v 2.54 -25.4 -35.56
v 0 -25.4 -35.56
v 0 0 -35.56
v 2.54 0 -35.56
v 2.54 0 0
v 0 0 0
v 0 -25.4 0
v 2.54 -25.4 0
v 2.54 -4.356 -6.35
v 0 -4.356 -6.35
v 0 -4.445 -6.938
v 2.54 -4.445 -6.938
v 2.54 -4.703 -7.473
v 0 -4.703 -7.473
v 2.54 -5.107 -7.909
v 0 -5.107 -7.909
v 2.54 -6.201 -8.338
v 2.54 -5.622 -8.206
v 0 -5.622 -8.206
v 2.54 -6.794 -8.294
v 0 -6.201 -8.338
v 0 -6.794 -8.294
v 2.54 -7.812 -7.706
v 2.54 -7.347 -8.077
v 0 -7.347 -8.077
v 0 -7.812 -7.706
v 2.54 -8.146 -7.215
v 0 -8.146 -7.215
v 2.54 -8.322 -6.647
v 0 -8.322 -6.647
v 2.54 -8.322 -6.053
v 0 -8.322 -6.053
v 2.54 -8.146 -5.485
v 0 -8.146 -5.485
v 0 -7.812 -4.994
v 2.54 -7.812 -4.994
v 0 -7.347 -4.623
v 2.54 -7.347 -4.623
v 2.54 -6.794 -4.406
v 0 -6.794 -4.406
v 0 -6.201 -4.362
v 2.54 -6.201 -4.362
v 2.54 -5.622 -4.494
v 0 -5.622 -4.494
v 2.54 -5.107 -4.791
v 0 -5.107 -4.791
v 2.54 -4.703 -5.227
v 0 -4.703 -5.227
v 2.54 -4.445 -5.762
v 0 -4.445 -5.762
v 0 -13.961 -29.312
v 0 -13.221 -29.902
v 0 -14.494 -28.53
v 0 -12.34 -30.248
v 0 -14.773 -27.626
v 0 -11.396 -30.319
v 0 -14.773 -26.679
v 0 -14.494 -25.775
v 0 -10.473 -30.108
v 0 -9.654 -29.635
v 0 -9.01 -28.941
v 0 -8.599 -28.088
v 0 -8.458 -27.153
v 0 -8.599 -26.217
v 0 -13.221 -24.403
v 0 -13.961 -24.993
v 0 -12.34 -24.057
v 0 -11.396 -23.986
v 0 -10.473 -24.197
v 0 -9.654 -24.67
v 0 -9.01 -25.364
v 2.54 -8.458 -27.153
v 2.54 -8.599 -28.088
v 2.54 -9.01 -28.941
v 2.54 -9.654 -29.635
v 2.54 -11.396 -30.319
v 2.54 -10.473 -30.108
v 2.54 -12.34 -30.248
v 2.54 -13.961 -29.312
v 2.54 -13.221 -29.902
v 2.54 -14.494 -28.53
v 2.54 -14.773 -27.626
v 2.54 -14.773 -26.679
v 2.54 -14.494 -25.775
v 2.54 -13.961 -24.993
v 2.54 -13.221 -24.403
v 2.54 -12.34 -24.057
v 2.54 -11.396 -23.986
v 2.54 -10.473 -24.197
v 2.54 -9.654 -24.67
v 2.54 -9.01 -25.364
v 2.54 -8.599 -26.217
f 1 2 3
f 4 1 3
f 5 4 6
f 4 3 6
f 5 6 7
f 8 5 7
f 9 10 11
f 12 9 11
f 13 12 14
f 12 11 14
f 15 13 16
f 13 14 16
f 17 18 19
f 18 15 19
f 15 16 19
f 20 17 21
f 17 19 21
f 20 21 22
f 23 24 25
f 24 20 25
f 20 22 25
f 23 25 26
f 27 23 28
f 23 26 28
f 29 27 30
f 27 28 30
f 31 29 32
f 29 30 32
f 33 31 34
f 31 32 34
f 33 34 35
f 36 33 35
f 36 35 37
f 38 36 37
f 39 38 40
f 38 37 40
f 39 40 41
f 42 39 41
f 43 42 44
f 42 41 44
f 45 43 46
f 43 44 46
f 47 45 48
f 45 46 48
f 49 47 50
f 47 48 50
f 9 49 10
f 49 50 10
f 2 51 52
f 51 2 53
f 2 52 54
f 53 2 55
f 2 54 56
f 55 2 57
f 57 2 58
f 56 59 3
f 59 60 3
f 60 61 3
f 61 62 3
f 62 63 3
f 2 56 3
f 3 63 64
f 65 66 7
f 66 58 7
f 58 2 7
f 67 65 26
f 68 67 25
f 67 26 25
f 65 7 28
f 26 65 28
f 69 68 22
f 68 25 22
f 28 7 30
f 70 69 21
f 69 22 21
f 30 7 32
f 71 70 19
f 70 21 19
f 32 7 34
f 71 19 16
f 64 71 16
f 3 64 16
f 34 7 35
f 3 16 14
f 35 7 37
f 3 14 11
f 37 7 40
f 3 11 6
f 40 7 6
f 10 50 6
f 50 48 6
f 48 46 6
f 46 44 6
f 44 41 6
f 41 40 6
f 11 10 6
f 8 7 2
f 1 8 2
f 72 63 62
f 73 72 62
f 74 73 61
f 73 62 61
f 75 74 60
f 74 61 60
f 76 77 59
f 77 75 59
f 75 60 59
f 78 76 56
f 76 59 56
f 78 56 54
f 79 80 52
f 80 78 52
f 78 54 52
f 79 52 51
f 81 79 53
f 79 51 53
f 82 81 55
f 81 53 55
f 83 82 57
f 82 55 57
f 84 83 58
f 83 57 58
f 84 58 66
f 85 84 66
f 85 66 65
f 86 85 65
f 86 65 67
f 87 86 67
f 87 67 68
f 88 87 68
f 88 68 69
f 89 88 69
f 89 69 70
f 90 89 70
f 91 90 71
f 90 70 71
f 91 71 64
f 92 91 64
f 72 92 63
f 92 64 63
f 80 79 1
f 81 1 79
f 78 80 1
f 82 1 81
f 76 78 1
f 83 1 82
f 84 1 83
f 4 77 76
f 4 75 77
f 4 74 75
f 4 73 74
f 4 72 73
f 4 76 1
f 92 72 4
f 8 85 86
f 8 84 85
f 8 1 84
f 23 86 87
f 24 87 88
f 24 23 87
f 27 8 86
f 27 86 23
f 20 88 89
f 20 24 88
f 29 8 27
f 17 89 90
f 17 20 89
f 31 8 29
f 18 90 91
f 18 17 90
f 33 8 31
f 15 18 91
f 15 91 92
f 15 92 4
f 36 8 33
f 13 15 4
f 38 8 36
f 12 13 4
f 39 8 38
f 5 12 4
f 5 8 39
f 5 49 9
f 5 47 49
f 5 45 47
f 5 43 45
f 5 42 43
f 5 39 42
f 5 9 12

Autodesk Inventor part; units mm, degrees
ref_plane "YZ Plane" through (0, 0, 0) normal (1, 0, 0) x (0, 1, 0)
ref_plane "XZ Plane" through (0, 0, 0) normal (0, 1, 0) x (-1, 0, 0)
ref_plane "XY Plane" through (0, 0, 0) normal (0, 0, 1) x (1, 0, 0)
sketch "Sketch1" plane through (0, 0, 0) normal (1, 0, 0) x (0, 1, 0)
  circle A0 centre (-6.35, -6.35) radius 1.9939
  circle A1 centre (-11.6332, -27.1526) radius 3.175
  line L0 (0, 0) -> (-25.4, 0)
  line L1 (-25.4, 0) -> (-25.4, -35.56)
  line L2 (-25.4, -35.56) -> (0, -35.56)
  line L3 (0, -35.56) -> (0, 0)
  dimension "d2" = 3.9878
  dimension "d5" = 6.35
  dimension "d6" = 25.4
  dimension "d7" = 35.56
extrude "Extrusion1" add sketch "Sketch1" along normal blind 2.54
properties part number "mounting bracket"
